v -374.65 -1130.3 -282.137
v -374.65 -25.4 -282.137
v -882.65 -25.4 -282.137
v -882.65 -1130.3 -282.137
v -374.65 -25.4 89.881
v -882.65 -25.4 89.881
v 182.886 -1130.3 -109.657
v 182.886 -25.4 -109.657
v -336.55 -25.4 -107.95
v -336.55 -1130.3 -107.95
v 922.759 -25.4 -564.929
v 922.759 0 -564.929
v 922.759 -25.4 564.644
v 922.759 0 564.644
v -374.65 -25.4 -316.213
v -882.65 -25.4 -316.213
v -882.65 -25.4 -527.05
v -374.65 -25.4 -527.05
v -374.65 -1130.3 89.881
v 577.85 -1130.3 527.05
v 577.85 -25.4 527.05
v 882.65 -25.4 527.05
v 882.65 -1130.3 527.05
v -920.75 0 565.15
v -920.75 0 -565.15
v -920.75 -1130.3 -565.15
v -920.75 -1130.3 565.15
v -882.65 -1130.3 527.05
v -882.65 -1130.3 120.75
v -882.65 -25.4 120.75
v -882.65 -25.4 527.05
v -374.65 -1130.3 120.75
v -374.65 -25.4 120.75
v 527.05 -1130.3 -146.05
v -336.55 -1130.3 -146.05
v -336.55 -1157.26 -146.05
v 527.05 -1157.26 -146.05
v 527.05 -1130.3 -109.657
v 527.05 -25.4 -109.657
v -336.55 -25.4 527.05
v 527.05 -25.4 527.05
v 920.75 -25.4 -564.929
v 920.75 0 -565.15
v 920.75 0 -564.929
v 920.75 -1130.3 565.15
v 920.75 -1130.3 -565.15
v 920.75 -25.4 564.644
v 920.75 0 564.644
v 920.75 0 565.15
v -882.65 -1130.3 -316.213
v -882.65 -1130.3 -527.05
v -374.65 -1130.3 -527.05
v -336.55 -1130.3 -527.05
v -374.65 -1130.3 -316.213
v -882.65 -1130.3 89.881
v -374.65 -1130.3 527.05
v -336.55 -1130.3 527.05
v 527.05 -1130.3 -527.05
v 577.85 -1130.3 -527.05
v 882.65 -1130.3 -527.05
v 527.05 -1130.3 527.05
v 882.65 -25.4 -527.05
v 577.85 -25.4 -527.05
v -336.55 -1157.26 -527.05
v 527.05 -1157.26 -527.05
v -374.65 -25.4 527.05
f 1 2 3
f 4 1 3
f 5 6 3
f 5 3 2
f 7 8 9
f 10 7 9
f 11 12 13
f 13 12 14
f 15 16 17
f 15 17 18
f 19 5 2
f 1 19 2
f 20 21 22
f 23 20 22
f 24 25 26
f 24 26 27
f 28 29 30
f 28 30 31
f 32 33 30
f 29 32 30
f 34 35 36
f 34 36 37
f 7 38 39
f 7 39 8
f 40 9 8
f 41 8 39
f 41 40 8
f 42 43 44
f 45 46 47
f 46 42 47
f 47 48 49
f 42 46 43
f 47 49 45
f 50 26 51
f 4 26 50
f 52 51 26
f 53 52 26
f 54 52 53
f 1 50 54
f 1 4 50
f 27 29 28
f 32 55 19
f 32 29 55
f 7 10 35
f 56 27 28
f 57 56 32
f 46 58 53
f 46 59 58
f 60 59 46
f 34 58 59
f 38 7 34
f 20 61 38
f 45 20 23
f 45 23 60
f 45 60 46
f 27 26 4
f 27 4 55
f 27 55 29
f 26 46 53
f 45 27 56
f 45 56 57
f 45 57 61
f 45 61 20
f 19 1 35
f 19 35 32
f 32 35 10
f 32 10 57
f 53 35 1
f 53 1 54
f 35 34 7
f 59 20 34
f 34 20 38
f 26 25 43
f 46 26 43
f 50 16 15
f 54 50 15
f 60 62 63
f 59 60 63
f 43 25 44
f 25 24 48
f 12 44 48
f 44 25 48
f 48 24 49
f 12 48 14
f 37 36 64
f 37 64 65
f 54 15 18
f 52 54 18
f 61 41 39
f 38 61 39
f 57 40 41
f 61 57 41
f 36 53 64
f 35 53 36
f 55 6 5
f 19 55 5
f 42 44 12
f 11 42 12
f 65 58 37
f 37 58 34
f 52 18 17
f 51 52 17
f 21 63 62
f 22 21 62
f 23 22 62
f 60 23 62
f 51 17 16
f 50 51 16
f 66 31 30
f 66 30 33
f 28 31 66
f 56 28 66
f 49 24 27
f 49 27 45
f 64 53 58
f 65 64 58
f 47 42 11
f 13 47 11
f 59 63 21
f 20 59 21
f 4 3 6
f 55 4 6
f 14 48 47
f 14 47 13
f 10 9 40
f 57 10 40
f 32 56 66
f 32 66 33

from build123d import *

# Parameters (mm, degrees)
F0_W      = 1841.5
F0_H      = 1130.3
F1_DEPTH  = 1130.3
F3_W      = 1827.532351
F3_H      = 1129.572153
F4_DEPTH  = 25.4
F5_W      = 865.357041
F5_H      = 376.358599
F6_DEPTH  = 25.4
F7_W      = 831.391633
F7_H      = 382.297545
F8_DEPTH  = 25.4
F9_W      = 863.6
F9_H      = 381
F10_DEPTH = 1131.859899


with BuildPart() as f1:
    # F0 (on Front) → F1 (new body)
    with BuildSketch(Plane.XZ):
        Rectangle(F0_W, F0_H)
        Polygon((882.65, 527.05), (882.65, -527.05), (577.85, -527.05), (527.05, -527.05), (-336.55, -527.05), (-374.65, -527.05), (-882.65, -527.05), (-882.65, -316.212654), (-882.65, -282.136858), (-882.65, 89.881361), (-882.65, 120.749831), (-882.65, 527.05), (-374.65, 527.05), (-336.55, 527.05), (527.05, 527.05), (577.85, 527.05), align=None, mode=Mode.SUBTRACT)
        Polygon((-374.65, -527.05), (-336.55, -527.05), (-336.55, -146.05), (-336.55, -107.95), (-336.55, 0), (-336.55, 527.05), (-374.65, 527.05), (-374.65, 120.749831), (-374.65, 89.881361), (-374.65, -120.674253), (-374.65, -282.136858), (-374.65, -316.212654), align=None)
        Polygon((-374.65, 89.881361), (-374.65, 120.749831), (-752.773166, 120.749831), (-882.65, 120.749831), (-882.65, 89.881361), (-408.513486, 89.881361), align=None)
        Polygon((-882.65, -316.212654), (-374.65, -316.212654), (-374.65, -282.136858), (-408.513486, -282.136858), (-882.65, -282.136858), align=None)
        Polygon((-336.55, -107.95), (-336.55, -146.05), (182.885635, -147.757417), (182.885635, -109.657417), align=None)
        Polygon((182.885635, -147.757417), (527.05, -148.888707), (527.05, -109.657417), (182.885635, -109.657417), align=None)
        Polygon((527.05, -527.05), (577.85, -527.05), (577.85, -145.718575), (577.85, 527.05), (527.05, 527.05), (527.05, -109.657417), (527.05, -148.888707), align=None)
    extrude(amount=F1_DEPTH)

    # F3 (on face) → F4 (join)
    with BuildSketch(Plane.XZ):
        with Locations((8.99306, -0.142456)):
            Rectangle(F3_W, F3_H)
    extrude(amount=F4_DEPTH)

    # F5 (on face) → F6 (join)
    with BuildSketch(Plane.XZ.offset(25.4)):
        with Locations((94.785392, -343.243077)):
            Rectangle(F5_W, F5_H)
    extrude(amount=-F6_DEPTH)

    # F7 (on face) → F8 (join)
    with BuildSketch(Plane.XZ.offset(25.4)):
        with Locations((134.62612, -372.283206)):
            Rectangle(F7_W, F7_H)
    extrude(amount=-F8_DEPTH)

    # F9 (on face) → F10 (join)
    with BuildSketch(Plane.XZ.offset(25.4)):
        with Locations((95.25, -336.55)):
            Rectangle(F9_W, F9_H)
    extrude(amount=F10_DEPTH)


solid = f1.part
